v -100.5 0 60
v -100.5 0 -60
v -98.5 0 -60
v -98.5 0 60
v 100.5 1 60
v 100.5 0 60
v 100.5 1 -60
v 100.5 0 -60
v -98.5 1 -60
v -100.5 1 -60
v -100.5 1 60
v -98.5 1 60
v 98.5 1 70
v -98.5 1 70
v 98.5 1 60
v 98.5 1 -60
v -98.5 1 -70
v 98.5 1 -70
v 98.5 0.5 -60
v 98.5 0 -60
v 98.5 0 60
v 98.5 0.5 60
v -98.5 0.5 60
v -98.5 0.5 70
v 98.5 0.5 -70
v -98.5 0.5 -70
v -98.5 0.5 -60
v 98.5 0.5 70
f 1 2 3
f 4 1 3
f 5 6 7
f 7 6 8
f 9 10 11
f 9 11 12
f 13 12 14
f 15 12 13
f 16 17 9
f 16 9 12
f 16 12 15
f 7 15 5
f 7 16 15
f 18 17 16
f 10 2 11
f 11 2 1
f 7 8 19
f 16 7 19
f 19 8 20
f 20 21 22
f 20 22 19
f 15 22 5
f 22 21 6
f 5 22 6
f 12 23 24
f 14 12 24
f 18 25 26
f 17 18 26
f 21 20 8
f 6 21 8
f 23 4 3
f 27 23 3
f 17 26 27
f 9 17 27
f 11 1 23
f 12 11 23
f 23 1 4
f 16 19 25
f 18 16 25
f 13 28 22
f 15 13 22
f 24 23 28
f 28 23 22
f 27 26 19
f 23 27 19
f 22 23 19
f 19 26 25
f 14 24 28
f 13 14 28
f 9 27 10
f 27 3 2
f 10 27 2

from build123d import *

# Parameters (mm, degrees)
EXTRUDE_1_DEPTH     = 1
SKETCH_4_W          = 197
SKETCH_4_H          = 140
CUT_EXTRUDE_3_DEPTH = 0.5


with BuildPart() as part:
    # 草图1 → 凸台-拉伸1 (new body)
    with BuildSketch(Plane(origin=(0, 0, 0), x_dir=(1, 0, 0), z_dir=(0, 1, 0))):
        Polygon((-98.5, 60), (-100.5, 60), (-100.5, -60), (-98.5, -60), (-98.5, -70), (98.5, -70), (98.5, -60), (100.5, -60), (100.5, 60), (98.5, 60), (98.5, 70), (-98.5, 70), align=None)
    extrude(amount=EXTRUDE_1_DEPTH)

    # 草图4 → 切除-拉伸3 (cut)
    with BuildSketch(Plane(origin=(0, 0, 0), x_dir=(1, 0, 0), z_dir=(0, 1, 0))):
        Rectangle(SKETCH_4_W, SKETCH_4_H)
    extrude(amount=CUT_EXTRUDE_3_DEPTH, mode=Mode.SUBTRACT)


solid = part.part
